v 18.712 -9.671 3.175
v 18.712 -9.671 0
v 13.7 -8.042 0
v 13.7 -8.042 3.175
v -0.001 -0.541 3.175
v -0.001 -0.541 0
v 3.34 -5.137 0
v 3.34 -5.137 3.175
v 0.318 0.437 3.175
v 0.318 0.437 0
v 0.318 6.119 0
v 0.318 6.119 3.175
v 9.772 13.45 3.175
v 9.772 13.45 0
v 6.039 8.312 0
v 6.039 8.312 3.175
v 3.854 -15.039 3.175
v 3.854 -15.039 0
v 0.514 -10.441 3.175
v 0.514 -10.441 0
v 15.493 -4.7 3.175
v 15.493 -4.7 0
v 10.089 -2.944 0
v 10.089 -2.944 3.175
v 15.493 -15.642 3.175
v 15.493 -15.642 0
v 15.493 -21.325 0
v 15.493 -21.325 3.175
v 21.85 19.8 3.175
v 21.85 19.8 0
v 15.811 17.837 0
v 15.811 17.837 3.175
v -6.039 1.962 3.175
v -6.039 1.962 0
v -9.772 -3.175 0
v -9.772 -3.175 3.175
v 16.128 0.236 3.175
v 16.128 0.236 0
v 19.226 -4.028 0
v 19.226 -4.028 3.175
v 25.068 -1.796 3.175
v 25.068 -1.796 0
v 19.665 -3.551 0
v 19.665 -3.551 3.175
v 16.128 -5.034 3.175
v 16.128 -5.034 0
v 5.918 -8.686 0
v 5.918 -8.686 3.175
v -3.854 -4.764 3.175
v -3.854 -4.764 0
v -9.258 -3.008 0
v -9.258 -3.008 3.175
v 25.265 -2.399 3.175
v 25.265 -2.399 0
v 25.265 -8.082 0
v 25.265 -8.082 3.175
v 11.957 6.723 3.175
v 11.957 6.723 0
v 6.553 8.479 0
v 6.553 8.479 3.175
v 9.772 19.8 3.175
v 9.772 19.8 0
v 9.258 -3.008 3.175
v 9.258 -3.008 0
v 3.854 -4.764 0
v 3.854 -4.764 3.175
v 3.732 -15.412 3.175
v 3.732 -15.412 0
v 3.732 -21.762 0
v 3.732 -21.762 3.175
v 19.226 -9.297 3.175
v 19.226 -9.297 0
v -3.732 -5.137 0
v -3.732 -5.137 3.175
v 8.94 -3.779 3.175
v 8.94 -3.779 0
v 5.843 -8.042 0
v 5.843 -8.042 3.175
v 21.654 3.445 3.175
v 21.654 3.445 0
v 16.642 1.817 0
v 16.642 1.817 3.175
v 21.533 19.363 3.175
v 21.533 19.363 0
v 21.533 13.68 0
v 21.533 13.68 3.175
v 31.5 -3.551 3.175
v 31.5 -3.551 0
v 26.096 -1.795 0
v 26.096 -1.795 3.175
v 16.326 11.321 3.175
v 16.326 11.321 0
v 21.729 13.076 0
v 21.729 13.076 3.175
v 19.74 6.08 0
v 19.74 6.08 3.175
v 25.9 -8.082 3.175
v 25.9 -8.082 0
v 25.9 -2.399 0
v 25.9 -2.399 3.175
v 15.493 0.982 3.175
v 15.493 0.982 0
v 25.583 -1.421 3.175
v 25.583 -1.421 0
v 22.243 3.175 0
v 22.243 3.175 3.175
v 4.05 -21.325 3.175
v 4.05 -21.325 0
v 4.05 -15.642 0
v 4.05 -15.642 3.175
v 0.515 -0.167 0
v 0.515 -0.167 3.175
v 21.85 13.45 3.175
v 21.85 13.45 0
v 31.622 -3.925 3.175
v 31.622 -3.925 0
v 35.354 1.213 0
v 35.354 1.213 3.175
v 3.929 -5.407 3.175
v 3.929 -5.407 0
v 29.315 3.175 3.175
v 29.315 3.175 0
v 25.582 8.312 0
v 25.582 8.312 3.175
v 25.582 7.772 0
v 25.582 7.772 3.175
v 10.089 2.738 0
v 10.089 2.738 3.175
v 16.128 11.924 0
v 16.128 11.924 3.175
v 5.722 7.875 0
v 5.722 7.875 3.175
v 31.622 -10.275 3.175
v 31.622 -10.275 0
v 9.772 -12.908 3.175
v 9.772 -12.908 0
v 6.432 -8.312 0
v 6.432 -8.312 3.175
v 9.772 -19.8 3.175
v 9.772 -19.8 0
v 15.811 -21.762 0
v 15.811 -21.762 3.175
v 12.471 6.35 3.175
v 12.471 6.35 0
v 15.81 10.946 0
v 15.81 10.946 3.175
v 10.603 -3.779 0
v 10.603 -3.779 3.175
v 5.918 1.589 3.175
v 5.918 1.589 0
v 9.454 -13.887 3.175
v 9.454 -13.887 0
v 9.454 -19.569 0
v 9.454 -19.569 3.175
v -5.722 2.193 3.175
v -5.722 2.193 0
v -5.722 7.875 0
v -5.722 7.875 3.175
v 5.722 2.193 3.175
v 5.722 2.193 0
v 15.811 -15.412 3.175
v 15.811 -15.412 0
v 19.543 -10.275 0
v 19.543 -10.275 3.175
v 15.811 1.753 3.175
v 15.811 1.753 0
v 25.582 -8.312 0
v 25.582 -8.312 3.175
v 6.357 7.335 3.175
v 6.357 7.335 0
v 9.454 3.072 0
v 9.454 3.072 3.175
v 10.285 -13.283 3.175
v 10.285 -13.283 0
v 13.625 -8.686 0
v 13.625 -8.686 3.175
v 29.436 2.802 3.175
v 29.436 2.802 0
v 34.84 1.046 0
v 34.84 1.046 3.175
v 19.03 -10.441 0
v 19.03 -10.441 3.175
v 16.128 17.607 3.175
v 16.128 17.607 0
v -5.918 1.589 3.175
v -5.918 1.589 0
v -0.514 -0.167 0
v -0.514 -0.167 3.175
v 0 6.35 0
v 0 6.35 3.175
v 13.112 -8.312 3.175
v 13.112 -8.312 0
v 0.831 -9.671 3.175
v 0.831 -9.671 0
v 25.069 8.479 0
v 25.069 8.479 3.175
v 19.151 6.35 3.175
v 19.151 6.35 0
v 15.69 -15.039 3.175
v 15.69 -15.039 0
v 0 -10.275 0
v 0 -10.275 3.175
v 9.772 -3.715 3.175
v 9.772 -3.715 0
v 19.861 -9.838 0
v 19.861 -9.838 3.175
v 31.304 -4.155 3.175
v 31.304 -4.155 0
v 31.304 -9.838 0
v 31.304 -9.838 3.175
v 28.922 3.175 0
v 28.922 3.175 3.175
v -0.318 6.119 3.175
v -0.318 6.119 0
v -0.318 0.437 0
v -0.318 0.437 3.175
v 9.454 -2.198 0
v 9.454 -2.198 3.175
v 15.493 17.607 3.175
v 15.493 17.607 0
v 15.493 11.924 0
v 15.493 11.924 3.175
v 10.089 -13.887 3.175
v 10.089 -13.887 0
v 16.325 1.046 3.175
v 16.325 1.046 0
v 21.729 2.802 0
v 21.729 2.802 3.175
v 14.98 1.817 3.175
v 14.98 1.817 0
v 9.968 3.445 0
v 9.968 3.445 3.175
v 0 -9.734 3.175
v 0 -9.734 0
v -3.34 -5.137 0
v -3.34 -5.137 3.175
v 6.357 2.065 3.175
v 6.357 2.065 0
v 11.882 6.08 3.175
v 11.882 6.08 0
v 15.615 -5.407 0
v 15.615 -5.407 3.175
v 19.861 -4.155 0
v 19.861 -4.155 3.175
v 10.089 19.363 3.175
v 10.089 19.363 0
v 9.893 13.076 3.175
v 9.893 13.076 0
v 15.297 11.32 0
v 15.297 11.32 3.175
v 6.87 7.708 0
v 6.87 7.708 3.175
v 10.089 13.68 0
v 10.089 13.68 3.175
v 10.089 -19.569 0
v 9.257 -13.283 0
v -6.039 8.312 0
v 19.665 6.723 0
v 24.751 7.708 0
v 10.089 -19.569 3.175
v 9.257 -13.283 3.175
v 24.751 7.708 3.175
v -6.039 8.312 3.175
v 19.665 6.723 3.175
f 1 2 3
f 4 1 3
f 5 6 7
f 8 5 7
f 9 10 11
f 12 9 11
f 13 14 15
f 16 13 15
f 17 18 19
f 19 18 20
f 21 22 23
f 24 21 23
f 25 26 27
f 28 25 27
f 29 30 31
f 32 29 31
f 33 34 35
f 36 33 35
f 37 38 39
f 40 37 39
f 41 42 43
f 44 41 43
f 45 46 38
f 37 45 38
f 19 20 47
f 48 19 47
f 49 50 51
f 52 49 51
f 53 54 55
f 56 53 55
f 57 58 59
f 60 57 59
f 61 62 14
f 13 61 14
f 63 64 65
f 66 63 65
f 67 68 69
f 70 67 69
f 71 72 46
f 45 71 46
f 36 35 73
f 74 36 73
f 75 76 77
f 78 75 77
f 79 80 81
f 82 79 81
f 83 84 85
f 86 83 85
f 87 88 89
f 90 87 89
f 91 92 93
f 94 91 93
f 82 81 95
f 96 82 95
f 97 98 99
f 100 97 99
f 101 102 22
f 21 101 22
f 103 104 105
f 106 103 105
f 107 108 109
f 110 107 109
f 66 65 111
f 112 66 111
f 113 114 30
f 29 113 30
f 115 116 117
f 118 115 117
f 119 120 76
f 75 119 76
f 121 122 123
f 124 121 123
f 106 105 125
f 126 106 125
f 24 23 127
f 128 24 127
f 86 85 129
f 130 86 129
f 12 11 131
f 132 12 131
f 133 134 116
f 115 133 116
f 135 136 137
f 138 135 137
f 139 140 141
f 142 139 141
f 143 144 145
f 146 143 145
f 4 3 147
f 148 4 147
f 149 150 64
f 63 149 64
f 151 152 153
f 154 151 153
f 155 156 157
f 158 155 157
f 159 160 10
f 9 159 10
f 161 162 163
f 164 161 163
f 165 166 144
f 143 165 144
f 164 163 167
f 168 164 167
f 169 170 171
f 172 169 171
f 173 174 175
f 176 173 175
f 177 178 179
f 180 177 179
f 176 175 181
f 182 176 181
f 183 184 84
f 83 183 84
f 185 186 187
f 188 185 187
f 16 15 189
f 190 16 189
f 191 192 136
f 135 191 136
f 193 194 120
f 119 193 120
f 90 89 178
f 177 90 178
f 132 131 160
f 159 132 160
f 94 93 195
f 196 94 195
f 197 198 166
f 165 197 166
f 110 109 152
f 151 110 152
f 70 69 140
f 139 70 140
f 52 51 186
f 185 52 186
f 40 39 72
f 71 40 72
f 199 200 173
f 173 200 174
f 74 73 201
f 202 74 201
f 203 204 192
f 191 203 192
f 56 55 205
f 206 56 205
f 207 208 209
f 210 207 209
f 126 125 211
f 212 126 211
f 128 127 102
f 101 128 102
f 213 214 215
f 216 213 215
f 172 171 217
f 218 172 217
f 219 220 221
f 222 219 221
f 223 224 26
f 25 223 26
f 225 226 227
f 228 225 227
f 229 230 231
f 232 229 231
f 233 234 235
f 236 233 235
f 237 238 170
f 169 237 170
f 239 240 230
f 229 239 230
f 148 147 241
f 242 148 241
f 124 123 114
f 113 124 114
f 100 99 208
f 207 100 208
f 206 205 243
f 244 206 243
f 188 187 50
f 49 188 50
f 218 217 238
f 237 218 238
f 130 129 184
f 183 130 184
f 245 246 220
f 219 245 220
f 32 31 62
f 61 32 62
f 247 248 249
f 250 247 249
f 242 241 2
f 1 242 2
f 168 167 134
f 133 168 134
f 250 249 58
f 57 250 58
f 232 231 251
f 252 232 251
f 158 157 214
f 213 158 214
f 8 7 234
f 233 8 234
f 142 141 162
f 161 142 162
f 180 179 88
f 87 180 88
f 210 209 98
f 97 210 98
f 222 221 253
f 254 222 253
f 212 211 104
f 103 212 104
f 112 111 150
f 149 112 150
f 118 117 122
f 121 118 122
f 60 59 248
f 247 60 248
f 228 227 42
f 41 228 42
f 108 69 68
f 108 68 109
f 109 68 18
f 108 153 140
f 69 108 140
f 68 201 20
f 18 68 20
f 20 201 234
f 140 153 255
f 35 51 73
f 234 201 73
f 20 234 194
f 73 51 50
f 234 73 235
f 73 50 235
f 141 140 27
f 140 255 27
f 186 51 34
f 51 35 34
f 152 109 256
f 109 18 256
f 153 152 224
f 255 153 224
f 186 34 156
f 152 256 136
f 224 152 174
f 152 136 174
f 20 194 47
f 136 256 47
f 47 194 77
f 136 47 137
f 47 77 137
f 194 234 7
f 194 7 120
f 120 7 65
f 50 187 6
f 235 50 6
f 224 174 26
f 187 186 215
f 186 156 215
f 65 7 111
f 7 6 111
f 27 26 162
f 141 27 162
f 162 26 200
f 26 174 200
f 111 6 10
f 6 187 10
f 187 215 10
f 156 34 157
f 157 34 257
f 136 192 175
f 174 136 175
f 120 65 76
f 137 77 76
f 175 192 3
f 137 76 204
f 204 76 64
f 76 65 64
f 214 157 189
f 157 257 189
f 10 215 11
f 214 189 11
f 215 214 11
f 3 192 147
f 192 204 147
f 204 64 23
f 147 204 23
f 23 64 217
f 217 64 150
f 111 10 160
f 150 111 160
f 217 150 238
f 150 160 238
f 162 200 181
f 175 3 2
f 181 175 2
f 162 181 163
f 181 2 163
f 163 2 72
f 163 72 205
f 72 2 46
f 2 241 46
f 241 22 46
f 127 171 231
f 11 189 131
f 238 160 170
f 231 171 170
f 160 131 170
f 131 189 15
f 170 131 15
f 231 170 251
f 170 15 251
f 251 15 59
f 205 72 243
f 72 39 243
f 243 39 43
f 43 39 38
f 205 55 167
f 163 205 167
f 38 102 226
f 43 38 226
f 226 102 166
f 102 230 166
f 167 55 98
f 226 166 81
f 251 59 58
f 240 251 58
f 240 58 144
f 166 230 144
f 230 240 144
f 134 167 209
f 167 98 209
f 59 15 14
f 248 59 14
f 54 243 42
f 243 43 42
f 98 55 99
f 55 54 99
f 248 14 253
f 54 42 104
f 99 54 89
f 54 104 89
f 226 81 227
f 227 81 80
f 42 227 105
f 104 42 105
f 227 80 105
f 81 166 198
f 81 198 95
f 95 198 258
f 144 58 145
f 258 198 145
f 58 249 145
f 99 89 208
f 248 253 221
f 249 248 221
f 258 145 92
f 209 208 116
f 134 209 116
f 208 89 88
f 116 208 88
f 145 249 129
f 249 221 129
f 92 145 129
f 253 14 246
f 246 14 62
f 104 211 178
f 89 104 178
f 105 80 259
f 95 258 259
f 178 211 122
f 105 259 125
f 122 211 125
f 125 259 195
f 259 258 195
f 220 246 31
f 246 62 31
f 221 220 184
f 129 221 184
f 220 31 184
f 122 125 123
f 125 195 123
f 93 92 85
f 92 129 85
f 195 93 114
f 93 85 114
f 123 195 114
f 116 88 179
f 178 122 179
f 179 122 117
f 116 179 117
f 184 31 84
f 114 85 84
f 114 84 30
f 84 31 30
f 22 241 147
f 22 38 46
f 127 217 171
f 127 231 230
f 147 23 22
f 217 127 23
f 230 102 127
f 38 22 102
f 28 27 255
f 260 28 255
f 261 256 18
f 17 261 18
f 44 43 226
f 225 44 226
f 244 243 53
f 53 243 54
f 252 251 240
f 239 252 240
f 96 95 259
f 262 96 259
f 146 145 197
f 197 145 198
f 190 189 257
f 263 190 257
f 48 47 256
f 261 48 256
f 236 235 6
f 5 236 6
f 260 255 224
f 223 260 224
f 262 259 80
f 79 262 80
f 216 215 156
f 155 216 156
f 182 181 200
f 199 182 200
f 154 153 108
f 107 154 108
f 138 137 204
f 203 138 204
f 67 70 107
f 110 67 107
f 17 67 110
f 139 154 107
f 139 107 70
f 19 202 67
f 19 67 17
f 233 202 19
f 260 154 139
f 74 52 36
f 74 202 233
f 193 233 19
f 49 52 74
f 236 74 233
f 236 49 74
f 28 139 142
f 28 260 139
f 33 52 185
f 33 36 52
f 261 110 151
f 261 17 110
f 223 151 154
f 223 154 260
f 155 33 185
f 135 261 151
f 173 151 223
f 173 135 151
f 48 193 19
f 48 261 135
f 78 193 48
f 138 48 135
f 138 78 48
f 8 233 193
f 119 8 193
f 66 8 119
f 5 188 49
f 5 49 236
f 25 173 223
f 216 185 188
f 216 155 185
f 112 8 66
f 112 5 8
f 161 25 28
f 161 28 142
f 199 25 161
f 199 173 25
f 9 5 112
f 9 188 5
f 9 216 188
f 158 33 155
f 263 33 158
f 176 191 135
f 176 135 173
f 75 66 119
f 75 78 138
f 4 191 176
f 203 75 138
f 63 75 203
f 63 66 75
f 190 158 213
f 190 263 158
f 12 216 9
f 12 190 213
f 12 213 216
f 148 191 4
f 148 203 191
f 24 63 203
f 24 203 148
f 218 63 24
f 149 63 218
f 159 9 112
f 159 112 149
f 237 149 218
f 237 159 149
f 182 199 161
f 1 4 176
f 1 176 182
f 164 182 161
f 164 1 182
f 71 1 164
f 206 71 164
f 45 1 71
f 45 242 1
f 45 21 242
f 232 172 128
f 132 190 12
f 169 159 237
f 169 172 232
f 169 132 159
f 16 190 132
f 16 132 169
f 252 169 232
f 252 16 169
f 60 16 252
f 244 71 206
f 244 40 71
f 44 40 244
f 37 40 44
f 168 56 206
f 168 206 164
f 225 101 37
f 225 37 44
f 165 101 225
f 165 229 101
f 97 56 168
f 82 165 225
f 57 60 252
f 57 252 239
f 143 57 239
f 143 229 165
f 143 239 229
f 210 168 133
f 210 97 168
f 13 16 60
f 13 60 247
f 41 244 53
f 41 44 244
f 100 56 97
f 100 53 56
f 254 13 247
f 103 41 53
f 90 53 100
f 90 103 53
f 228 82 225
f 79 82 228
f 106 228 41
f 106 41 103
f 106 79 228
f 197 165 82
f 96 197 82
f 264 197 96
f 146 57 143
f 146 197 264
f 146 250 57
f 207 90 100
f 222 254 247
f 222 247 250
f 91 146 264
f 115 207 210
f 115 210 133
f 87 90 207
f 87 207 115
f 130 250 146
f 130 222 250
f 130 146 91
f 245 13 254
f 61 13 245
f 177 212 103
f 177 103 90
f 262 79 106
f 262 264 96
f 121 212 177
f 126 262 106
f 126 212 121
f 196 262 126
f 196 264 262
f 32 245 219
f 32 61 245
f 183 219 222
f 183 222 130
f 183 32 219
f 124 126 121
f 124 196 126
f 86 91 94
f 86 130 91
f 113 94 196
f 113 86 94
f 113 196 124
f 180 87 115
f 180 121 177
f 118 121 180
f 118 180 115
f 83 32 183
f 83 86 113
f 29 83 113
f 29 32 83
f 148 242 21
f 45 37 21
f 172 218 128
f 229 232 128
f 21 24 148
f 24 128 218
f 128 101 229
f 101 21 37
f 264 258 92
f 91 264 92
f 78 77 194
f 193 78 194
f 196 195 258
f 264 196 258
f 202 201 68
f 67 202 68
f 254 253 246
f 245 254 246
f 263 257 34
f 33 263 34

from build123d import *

# Parameters (mm, degrees)
F1_DEPTH = 3.175


# Not quite as in the source:
# - a feature names something its author has since deleted; it is built from what else it names


with BuildPart() as f1:
    # F0 (on Top) → F1 (new body)
    with BuildSketch(Plane.XY):
        Polygon((6.0392088785, 8.3122579143), (0, 6.35), (-6.0392088785, 8.3122579143), (-6.0392088785, 1.9622579143), (-9.7716452305, -3.175), (-3.7324363521, -5.1372579143), (0, -10.2745158286), (3.7324363521, -15.4117737428), (3.7324363521, -21.7617737428), (9.7716452305, -19.7995158286), (15.810854109, -21.7617737428), (15.810854109, -15.4117737428), (19.5432904611, -10.2745158286), (25.5824993395, -8.3122579143), (31.621708218, -10.2745158286), (31.621708218, -3.9245158286), (35.3541445701, 1.2127420857), (29.3149356916, 3.175), (25.5824993395, 8.3122579143), (21.8500629875, 13.4495158286), (21.8500629875, 19.7995158286), (15.810854109, 17.8372579143), (9.7716452305, 19.7995158286), (9.7716452305, 13.4495158286), align=None)
        Polygon((9.4541452305, -19.5688385759), (4.0499363521, -21.3247724831), (4.0499363521, -15.6424509955), (9.4541452305, -13.8865170883), align=None, mode=Mode.SUBTRACT)
        Polygon((0.5137257914, -10.4414354567), (5.9179346699, -8.6855015495), (9.2567076833, -13.2829899238), (3.8537105606, -15.0385301076), align=None, mode=Mode.SUBTRACT)
        Polygon((-9.2579194391, -3.0080803719), (-5.9179346699, 1.5890142791), (-0.5137257914, -0.1669196281), (-3.8537105606, -4.7640142791), align=None, mode=Mode.SUBTRACT)
        Polygon((-0.0007489063, -0.5411940443), (3.3399847692, -5.1372579143), (0, -9.7343525653), (-3.3399847692, -5.1372579143), align=None, mode=Mode.SUBTRACT)
        Polygon((3.9286621435, -5.4073395459), (8.9404194391, -3.7789208878), (5.842983087, -8.0421762826), (0.8312257914, -9.6705949407), align=None, mode=Mode.SUBTRACT)
        Polygon((9.7716452305, -3.7151632633), (13.1116299997, -8.3122579143), (9.7723941368, -12.9083217842), (6.4316604613, -8.3122579143), align=None, mode=Mode.SUBTRACT)
        Polygon((9.2579194391, -3.0080803719), (3.8537105606, -4.7640142791), (0.5149375472, -0.1665259048), (5.9179346699, 1.5890142791), align=None, mode=Mode.SUBTRACT)
        Polygon((10.0891452305, -2.9443227474), (10.0891452305, 2.7379987403), (15.493354109, 0.9820648331), (15.493354109, -4.7002566545), align=None, mode=Mode.SUBTRACT)
        Polygon((15.493354109, -15.6424509955), (15.493354109, -21.3247724831), (10.0891452305, -19.5688385759), (10.0891452305, -13.8865170883), align=None, mode=Mode.SUBTRACT)
        Polygon((13.6253557912, -8.6855015495), (19.0295646696, -10.4414354567), (15.6895799004, -15.0385301076), (10.285371022, -13.2825962005), align=None, mode=Mode.SUBTRACT)
        Polygon((15.6146283176, -5.4073395459), (18.7120646696, -9.6705949407), (13.700307374, -8.0421762826), (10.602871022, -3.7789208878), align=None, mode=Mode.SUBTRACT)
        Polygon((19.2257904611, -9.2973513055), (16.128354109, -5.0340959107), (16.128354109, 0.2355775627), (19.2257904611, -4.0276778321), align=None, mode=Mode.SUBTRACT)
        Polygon((19.8607904611, -9.8375145688), (19.8607904611, -4.1551930812), (25.2649993395, -2.399259174), (25.2649993395, -8.0815806616), align=None, mode=Mode.SUBTRACT)
        Polygon((31.304208218, -9.8375145688), (25.8999993395, -8.0815806616), (25.8999993395, -2.399259174), (31.304208218, -4.1551930812), align=None, mode=Mode.SUBTRACT)
        Polygon((-5.7217088785, 7.8752566545), (-0.3175, 6.1193227474), (-0.3175, 0.4370012597), (-5.7217088785, 2.1929351669), align=None, mode=Mode.SUBTRACT)
        Polygon((5.7217088785, 7.8752566545), (5.7217088785, 2.1929351669), (0.3175, 0.4370012597), (0.3175, 6.1193227474), align=None, mode=Mode.SUBTRACT)
        Polygon((6.3567088785, 2.0654199178), (6.3567088785, 7.3350933912), (9.4541452305, 3.0718379964), (9.4541452305, -2.1978354769), align=None, mode=Mode.SUBTRACT)
        Polygon((9.967871022, 3.4450816317), (6.8704346699, 7.7083370264), (11.8821919655, 6.0799183683), (14.9796283176, 1.8166629736), align=None, mode=Mode.SUBTRACT)
        Polygon((6.5529346699, 8.4791775424), (9.8929194391, 13.0762721934), (15.2971283176, 11.3203382862), (11.9571435484, 6.7232436352), align=None, mode=Mode.SUBTRACT)
        Polygon((25.0675617923, -1.7957320095), (19.6645646696, -3.5512721934), (16.3245799004, 1.0458224576), (21.7287887789, 2.8017563648), align=None, mode=Mode.SUBTRACT)
        Polygon((15.810854109, 1.752905349), (12.4708693398, 6.35), (15.8101052028, 10.94606387), (19.1508388782, 6.35), align=None, mode=Mode.SUBTRACT)
        Polygon((21.6538371961, 3.4450816317), (16.6420799004, 1.8166629736), (19.7395162525, 6.0799183683), (24.7512735481, 7.7083370264), align=None, mode=Mode.SUBTRACT)
        Polygon((25.5832482458, -1.42106387), (22.2425145703, 3.175), (25.5824993395, 7.772094651), (28.9224841087, 3.175), align=None, mode=Mode.SUBTRACT)
        Polygon((29.4362099002, 2.8017563648), (34.8404187786, 1.0458224576), (31.5004340094, -3.5512721934), (26.096225131, -1.7953382862), align=None, mode=Mode.SUBTRACT)
        Polygon((21.7287887789, 13.0762721934), (25.0687735481, 8.4791775424), (19.6645646696, 6.7232436352), (16.3257916562, 11.3207320095), align=None, mode=Mode.SUBTRACT)
        Polygon((10.0891452305, 13.6801930812), (10.0891452305, 19.3625145688), (15.493354109, 17.6065806616), (15.493354109, 11.924259174), align=None, mode=Mode.SUBTRACT)
        Polygon((16.128354109, 17.6065806616), (21.5325629875, 19.3625145688), (21.5325629875, 13.6801930812), (16.128354109, 11.924259174), align=None, mode=Mode.SUBTRACT)
    extrude(amount=F1_DEPTH)


solid = f1.part
